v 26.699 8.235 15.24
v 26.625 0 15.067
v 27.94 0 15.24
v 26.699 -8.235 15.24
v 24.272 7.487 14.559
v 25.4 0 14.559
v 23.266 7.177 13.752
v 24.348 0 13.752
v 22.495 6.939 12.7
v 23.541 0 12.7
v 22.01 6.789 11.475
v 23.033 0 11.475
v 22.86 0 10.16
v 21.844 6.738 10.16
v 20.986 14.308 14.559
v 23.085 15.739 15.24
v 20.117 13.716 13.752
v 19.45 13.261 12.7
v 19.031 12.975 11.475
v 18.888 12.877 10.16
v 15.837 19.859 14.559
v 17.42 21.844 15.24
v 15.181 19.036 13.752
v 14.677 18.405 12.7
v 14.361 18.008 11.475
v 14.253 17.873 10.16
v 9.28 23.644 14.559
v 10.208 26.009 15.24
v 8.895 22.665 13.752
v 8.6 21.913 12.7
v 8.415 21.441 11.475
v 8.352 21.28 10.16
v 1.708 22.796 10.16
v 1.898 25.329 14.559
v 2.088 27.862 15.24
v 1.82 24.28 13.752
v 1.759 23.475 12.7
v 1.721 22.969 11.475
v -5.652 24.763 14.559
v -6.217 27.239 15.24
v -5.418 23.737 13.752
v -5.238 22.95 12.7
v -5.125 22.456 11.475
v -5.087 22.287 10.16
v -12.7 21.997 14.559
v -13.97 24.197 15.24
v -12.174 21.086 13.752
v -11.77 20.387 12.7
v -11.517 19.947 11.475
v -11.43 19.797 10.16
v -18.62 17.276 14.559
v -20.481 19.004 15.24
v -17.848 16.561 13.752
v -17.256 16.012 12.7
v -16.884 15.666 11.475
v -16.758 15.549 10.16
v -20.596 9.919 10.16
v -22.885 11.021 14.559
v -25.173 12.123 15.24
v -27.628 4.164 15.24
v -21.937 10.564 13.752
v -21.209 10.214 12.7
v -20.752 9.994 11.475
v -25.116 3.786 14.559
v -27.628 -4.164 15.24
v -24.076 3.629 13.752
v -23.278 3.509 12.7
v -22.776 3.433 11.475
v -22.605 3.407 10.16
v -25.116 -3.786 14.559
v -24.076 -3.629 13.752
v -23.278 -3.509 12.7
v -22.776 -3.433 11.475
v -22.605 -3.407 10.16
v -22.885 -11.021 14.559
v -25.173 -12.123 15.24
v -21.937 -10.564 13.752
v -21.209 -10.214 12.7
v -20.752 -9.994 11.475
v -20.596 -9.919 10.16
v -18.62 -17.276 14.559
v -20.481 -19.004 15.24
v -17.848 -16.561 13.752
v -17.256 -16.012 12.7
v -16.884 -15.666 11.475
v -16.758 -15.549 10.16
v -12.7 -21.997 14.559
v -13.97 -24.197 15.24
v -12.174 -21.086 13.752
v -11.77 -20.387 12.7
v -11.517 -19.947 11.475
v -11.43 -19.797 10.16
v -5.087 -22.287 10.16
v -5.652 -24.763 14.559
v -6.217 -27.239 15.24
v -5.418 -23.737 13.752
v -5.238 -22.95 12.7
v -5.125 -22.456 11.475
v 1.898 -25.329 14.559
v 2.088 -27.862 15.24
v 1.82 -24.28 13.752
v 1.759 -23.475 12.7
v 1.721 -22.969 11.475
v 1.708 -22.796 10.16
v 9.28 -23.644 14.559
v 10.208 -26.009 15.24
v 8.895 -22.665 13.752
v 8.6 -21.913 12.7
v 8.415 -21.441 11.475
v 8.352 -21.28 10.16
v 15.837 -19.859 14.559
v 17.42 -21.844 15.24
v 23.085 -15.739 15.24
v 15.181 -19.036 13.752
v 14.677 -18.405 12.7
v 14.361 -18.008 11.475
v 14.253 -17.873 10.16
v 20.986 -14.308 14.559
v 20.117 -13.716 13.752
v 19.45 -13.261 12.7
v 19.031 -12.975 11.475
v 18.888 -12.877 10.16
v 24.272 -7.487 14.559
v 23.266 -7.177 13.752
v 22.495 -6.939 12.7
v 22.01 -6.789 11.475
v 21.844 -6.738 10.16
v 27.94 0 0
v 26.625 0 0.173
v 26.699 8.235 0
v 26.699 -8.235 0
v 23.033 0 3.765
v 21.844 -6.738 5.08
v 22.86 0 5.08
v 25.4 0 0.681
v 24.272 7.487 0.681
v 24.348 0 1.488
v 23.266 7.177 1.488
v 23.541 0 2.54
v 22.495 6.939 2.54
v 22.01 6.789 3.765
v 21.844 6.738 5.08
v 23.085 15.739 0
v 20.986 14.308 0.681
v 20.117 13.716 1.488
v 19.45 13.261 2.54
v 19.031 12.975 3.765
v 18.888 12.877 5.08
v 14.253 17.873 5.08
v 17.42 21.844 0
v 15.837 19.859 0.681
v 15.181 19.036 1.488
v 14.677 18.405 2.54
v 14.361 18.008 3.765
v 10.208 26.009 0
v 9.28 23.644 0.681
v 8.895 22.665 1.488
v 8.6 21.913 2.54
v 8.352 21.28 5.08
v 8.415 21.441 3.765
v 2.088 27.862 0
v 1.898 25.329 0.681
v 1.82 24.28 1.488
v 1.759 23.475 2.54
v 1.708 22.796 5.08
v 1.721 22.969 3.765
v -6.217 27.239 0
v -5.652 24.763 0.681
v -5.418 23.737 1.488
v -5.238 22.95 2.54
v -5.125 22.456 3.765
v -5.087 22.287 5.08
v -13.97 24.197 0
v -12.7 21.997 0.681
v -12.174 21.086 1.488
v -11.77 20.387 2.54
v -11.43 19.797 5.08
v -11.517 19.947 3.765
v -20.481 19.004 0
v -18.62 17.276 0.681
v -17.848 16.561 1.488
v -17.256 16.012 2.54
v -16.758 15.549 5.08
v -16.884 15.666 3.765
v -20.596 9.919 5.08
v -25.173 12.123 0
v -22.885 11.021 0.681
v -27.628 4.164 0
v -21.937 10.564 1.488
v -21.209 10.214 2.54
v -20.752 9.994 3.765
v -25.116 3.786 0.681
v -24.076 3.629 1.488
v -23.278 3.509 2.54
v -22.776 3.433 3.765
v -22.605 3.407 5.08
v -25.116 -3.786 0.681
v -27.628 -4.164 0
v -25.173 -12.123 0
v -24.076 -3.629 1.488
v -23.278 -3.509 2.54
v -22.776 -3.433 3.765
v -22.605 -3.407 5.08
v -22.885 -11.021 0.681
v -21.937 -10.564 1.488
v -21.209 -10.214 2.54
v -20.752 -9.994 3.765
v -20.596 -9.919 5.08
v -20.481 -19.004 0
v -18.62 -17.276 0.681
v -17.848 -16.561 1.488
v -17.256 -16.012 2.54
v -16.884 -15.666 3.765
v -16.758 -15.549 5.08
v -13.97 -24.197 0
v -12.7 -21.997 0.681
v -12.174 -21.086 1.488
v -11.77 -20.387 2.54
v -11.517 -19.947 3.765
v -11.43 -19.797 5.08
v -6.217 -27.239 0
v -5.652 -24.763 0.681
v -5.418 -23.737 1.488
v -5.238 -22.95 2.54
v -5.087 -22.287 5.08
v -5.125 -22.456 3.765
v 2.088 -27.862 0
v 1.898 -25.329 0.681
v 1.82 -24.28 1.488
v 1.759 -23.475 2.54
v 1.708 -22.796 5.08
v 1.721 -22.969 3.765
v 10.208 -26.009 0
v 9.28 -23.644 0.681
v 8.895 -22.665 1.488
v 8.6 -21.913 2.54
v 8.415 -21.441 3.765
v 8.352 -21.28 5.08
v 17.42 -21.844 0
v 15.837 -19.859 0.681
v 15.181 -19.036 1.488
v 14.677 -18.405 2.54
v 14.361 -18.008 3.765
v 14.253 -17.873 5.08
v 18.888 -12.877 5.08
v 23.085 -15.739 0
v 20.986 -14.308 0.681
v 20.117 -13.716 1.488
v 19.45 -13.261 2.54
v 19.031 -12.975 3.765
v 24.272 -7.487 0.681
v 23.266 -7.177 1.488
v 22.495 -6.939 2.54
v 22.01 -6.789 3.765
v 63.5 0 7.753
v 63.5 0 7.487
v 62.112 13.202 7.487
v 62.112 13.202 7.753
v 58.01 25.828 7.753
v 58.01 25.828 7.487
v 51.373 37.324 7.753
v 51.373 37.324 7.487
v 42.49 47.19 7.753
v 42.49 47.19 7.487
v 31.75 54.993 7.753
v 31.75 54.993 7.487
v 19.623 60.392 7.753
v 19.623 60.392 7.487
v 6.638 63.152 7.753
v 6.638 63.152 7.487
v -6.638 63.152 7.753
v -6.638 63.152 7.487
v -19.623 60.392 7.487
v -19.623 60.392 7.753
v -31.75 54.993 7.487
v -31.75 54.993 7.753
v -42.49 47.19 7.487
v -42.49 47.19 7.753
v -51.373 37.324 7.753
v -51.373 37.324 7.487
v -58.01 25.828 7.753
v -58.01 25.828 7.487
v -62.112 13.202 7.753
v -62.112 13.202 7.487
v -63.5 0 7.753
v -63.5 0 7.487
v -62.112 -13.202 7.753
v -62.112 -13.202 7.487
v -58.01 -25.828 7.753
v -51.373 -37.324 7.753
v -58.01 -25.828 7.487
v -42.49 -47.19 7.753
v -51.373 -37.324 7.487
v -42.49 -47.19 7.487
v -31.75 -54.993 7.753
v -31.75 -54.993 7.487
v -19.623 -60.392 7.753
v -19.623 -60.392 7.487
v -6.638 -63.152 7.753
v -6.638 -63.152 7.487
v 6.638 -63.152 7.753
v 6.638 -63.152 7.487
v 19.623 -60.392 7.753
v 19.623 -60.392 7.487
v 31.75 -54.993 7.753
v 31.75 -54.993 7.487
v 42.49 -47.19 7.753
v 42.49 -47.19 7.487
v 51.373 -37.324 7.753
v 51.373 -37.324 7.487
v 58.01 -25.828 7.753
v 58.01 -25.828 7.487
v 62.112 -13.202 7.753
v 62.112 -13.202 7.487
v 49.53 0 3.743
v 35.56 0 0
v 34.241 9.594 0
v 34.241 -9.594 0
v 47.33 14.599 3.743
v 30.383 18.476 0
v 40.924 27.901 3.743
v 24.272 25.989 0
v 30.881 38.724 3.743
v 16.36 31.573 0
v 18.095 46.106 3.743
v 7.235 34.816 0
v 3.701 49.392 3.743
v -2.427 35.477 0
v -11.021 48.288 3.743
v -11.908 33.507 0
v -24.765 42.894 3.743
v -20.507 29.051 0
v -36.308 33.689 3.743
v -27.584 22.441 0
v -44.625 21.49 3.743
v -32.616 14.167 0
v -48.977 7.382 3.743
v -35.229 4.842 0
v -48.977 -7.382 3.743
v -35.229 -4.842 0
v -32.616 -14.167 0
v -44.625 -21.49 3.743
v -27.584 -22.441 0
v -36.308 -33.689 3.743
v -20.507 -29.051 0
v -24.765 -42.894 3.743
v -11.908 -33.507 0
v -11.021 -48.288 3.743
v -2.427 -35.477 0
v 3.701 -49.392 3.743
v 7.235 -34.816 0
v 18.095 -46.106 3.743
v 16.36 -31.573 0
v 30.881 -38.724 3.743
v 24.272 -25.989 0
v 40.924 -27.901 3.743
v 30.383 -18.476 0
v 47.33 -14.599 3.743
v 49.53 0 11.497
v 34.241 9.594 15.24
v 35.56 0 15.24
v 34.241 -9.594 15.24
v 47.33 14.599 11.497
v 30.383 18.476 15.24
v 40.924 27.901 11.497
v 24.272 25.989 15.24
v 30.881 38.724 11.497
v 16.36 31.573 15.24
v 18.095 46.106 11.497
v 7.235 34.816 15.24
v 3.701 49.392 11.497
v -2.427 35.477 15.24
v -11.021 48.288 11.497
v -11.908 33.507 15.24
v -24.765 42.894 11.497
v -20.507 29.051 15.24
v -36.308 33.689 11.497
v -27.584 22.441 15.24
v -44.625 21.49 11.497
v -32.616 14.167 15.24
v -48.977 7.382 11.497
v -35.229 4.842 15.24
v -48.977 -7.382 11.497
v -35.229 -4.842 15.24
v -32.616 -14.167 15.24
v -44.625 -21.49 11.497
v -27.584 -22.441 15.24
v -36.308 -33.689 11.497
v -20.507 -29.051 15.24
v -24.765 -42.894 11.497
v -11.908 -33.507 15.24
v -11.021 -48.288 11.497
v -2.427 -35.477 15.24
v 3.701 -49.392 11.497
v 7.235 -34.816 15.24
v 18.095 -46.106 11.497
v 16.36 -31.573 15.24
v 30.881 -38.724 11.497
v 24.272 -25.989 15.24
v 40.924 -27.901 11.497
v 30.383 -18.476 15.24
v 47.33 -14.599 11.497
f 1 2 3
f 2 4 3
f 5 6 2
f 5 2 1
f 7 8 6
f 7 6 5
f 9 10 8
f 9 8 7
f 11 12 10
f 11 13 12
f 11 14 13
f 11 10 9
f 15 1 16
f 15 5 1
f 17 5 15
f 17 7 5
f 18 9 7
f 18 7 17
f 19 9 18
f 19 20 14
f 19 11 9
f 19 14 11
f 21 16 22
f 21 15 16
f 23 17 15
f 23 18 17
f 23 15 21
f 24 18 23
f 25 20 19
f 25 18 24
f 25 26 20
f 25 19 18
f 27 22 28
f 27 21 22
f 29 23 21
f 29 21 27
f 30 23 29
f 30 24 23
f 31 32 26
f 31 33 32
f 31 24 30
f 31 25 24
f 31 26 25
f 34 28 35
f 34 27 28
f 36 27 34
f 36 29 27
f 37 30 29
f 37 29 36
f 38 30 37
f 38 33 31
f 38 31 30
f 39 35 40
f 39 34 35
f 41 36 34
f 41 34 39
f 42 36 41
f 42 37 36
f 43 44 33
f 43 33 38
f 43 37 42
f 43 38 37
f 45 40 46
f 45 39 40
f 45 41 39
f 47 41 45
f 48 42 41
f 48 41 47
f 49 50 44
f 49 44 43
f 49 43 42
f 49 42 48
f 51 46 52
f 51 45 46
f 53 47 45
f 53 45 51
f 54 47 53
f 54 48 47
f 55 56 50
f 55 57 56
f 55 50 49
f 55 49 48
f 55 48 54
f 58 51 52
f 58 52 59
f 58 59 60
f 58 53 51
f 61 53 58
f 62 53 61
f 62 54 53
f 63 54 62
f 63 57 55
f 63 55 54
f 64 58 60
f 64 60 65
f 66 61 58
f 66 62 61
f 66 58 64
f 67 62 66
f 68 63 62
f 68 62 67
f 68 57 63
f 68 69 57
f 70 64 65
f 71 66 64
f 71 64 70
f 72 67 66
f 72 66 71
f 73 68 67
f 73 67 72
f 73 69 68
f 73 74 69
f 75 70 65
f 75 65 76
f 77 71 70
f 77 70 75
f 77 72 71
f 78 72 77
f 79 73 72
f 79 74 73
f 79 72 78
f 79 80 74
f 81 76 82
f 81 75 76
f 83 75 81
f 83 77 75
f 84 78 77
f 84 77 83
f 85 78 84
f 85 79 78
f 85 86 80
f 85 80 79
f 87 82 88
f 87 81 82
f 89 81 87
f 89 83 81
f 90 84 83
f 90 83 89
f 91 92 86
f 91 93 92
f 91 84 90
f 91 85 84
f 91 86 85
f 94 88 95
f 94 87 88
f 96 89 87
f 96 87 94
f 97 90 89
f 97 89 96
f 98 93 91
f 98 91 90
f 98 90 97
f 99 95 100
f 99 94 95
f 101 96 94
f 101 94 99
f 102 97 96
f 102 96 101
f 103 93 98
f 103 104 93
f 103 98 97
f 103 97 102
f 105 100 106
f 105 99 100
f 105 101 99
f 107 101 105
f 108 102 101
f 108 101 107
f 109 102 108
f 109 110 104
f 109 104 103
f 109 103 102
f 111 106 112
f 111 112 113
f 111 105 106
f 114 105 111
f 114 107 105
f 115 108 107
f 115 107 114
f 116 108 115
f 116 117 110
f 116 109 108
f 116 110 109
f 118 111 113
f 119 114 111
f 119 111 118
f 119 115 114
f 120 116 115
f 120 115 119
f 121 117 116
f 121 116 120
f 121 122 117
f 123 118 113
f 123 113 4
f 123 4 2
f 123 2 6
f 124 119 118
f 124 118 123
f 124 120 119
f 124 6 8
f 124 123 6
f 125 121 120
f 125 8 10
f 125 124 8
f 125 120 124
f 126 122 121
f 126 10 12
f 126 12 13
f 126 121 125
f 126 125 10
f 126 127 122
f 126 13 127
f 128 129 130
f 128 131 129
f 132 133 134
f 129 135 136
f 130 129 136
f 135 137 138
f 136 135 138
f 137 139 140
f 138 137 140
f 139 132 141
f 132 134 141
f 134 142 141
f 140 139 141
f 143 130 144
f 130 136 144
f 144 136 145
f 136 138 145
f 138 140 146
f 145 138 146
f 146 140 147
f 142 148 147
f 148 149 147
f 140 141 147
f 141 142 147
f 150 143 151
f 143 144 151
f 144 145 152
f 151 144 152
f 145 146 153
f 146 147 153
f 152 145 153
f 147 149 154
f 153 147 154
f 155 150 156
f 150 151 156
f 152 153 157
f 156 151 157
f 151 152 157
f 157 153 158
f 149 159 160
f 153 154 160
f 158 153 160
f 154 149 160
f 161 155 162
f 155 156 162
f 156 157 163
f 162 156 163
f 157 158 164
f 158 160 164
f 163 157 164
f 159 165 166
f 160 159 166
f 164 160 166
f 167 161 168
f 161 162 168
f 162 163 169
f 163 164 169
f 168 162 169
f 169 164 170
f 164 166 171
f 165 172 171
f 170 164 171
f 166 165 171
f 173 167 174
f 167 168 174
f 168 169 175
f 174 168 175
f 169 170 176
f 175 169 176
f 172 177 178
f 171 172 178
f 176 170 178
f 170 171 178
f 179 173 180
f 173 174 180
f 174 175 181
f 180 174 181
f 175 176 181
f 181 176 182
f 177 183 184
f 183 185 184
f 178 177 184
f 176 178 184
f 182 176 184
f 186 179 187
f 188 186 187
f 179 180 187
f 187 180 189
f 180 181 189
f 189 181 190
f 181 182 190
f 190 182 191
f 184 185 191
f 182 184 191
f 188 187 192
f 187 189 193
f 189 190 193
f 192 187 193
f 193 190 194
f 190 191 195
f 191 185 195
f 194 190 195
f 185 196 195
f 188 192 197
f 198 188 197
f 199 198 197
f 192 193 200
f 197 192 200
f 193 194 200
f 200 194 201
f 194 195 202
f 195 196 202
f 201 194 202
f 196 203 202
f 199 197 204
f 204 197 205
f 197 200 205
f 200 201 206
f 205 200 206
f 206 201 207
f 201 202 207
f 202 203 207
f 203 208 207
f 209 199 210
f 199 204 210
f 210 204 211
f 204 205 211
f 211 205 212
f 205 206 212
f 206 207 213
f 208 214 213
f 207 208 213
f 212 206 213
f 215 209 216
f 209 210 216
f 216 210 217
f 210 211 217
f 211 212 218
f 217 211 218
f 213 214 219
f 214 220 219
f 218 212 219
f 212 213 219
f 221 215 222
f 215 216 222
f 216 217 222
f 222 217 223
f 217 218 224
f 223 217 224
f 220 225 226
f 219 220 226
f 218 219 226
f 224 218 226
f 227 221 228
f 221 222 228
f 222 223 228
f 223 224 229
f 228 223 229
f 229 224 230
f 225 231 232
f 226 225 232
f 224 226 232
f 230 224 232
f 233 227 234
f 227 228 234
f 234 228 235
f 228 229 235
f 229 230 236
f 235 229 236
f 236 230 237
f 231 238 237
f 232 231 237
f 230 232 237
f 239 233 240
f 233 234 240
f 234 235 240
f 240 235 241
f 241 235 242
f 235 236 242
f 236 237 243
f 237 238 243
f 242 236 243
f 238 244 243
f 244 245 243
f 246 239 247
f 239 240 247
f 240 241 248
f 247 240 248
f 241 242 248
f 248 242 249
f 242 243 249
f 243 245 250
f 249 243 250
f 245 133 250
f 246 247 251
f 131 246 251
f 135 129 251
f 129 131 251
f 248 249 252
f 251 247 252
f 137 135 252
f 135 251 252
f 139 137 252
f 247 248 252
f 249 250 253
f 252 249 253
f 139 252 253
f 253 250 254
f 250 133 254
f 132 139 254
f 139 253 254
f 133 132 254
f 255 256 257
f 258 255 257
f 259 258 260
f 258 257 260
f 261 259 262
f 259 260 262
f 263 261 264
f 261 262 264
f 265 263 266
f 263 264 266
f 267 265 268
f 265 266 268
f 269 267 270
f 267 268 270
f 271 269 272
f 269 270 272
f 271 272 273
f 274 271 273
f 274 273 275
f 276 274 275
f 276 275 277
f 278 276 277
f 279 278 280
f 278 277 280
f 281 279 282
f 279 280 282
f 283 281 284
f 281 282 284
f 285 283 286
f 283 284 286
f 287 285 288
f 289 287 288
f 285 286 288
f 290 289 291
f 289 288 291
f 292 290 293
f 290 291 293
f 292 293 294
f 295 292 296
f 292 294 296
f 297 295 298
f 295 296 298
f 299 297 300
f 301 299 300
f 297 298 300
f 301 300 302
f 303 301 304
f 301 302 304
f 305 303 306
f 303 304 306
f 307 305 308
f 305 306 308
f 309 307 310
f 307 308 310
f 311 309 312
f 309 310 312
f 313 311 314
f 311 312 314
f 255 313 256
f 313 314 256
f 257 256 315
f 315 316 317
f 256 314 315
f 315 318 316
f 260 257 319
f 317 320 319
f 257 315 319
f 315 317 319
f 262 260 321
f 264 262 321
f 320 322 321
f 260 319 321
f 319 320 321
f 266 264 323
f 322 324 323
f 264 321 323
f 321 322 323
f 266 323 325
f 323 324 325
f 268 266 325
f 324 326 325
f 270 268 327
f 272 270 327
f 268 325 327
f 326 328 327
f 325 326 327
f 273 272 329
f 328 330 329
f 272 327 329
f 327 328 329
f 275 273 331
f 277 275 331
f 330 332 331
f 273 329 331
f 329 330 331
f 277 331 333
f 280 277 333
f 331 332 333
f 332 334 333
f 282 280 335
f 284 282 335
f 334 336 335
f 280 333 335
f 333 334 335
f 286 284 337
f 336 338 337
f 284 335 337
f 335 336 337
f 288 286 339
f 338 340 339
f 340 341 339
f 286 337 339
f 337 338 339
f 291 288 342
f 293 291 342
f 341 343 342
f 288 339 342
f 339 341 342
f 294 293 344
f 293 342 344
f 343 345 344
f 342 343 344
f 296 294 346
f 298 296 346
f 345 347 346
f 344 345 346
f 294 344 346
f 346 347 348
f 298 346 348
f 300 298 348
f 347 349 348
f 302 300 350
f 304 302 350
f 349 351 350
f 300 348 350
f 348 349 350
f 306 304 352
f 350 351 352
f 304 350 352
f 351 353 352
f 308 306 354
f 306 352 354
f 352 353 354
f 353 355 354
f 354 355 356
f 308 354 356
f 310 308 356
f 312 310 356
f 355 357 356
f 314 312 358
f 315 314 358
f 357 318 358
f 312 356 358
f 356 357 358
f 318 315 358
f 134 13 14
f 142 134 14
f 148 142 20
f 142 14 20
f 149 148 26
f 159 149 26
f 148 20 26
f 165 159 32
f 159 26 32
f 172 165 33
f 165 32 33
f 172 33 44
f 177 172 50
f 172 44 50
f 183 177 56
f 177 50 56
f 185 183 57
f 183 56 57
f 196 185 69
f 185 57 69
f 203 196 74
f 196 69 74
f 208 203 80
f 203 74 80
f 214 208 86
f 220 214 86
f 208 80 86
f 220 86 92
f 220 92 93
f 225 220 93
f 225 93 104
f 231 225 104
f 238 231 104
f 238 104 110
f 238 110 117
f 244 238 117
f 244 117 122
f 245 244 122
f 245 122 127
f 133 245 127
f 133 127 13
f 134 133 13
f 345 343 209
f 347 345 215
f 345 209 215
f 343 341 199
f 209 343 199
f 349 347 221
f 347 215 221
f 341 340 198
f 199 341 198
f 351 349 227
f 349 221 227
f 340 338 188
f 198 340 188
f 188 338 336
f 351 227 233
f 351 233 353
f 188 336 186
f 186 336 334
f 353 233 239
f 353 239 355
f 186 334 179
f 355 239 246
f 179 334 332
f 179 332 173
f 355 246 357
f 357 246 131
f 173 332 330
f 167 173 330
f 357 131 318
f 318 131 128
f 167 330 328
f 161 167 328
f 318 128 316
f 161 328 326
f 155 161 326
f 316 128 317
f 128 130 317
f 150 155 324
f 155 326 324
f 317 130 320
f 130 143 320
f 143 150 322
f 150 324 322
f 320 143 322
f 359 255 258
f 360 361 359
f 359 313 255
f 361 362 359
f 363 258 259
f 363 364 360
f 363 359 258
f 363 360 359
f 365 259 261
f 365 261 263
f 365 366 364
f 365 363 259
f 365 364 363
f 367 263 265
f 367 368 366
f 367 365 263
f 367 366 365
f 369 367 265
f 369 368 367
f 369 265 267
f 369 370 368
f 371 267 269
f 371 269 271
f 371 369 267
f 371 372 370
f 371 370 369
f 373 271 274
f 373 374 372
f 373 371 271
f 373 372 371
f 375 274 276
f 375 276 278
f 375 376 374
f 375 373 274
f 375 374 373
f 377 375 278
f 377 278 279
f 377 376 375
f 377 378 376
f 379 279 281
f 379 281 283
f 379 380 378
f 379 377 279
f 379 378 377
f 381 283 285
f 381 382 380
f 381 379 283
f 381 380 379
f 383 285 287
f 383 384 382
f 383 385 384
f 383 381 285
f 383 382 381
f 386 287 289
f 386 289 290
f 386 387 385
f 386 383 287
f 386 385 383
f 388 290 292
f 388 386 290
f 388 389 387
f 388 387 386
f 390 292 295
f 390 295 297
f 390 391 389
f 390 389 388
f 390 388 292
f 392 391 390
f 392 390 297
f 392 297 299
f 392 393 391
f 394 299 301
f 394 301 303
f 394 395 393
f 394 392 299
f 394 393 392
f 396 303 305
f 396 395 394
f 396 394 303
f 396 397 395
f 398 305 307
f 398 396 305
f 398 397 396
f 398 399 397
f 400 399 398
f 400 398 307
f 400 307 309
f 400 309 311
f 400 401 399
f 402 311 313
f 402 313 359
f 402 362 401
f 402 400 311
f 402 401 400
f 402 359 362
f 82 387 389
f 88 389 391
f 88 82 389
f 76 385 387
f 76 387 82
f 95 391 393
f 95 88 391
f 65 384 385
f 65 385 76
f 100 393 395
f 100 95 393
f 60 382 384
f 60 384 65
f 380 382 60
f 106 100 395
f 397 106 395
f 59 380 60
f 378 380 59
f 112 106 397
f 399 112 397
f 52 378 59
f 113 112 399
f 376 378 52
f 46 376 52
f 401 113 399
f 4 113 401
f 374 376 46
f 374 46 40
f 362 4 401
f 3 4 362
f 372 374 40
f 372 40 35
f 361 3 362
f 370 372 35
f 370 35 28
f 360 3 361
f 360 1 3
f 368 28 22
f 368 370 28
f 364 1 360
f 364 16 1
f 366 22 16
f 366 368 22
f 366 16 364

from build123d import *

# Parameters (mm, degrees)
F0_R     = 63.5
F1_DEPTH = 15.24
F2_SIZE2 = 27.94
F2_SIZE  = 7.4865004365
F3_R     = 22.86
F4_DEPTH = 25.4
F5_R     = 5.08


with BuildPart() as f1:
    # F0 (on Top) → F1 (new body)
    with BuildSketch(Plane.XY):
        Circle(F0_R)
    extrude(amount=F1_DEPTH)

    # F2
    f2_edges = [f1.edges().sort_by_distance(p)[0] for p in [
        (-63.5, 0, 15.24),
        (63.5, 0, 7.62),
        (-63.5, 0, 0),
    ]]
    f2_side = f1.faces().sort_by_distance((-63.5, 0, 7.62))[0]
    chamfer(f2_edges, length=F2_SIZE, length2=F2_SIZE2, reference=f2_side)

    # F3 (on face) → F4 (cut)
    with BuildSketch(Plane.XY.offset(15.24)):
        Circle(F3_R)
    extrude(amount=-F4_DEPTH, mode=Mode.SUBTRACT)

    # F5
    f5_edges = [f1.edges().sort_by_distance(p)[0] for p in [
        (-22.86, 0, 15.24),
        (-22.86, 0, 0),
    ]]
    fillet(f5_edges, radius=F5_R)


solid = f1.part
